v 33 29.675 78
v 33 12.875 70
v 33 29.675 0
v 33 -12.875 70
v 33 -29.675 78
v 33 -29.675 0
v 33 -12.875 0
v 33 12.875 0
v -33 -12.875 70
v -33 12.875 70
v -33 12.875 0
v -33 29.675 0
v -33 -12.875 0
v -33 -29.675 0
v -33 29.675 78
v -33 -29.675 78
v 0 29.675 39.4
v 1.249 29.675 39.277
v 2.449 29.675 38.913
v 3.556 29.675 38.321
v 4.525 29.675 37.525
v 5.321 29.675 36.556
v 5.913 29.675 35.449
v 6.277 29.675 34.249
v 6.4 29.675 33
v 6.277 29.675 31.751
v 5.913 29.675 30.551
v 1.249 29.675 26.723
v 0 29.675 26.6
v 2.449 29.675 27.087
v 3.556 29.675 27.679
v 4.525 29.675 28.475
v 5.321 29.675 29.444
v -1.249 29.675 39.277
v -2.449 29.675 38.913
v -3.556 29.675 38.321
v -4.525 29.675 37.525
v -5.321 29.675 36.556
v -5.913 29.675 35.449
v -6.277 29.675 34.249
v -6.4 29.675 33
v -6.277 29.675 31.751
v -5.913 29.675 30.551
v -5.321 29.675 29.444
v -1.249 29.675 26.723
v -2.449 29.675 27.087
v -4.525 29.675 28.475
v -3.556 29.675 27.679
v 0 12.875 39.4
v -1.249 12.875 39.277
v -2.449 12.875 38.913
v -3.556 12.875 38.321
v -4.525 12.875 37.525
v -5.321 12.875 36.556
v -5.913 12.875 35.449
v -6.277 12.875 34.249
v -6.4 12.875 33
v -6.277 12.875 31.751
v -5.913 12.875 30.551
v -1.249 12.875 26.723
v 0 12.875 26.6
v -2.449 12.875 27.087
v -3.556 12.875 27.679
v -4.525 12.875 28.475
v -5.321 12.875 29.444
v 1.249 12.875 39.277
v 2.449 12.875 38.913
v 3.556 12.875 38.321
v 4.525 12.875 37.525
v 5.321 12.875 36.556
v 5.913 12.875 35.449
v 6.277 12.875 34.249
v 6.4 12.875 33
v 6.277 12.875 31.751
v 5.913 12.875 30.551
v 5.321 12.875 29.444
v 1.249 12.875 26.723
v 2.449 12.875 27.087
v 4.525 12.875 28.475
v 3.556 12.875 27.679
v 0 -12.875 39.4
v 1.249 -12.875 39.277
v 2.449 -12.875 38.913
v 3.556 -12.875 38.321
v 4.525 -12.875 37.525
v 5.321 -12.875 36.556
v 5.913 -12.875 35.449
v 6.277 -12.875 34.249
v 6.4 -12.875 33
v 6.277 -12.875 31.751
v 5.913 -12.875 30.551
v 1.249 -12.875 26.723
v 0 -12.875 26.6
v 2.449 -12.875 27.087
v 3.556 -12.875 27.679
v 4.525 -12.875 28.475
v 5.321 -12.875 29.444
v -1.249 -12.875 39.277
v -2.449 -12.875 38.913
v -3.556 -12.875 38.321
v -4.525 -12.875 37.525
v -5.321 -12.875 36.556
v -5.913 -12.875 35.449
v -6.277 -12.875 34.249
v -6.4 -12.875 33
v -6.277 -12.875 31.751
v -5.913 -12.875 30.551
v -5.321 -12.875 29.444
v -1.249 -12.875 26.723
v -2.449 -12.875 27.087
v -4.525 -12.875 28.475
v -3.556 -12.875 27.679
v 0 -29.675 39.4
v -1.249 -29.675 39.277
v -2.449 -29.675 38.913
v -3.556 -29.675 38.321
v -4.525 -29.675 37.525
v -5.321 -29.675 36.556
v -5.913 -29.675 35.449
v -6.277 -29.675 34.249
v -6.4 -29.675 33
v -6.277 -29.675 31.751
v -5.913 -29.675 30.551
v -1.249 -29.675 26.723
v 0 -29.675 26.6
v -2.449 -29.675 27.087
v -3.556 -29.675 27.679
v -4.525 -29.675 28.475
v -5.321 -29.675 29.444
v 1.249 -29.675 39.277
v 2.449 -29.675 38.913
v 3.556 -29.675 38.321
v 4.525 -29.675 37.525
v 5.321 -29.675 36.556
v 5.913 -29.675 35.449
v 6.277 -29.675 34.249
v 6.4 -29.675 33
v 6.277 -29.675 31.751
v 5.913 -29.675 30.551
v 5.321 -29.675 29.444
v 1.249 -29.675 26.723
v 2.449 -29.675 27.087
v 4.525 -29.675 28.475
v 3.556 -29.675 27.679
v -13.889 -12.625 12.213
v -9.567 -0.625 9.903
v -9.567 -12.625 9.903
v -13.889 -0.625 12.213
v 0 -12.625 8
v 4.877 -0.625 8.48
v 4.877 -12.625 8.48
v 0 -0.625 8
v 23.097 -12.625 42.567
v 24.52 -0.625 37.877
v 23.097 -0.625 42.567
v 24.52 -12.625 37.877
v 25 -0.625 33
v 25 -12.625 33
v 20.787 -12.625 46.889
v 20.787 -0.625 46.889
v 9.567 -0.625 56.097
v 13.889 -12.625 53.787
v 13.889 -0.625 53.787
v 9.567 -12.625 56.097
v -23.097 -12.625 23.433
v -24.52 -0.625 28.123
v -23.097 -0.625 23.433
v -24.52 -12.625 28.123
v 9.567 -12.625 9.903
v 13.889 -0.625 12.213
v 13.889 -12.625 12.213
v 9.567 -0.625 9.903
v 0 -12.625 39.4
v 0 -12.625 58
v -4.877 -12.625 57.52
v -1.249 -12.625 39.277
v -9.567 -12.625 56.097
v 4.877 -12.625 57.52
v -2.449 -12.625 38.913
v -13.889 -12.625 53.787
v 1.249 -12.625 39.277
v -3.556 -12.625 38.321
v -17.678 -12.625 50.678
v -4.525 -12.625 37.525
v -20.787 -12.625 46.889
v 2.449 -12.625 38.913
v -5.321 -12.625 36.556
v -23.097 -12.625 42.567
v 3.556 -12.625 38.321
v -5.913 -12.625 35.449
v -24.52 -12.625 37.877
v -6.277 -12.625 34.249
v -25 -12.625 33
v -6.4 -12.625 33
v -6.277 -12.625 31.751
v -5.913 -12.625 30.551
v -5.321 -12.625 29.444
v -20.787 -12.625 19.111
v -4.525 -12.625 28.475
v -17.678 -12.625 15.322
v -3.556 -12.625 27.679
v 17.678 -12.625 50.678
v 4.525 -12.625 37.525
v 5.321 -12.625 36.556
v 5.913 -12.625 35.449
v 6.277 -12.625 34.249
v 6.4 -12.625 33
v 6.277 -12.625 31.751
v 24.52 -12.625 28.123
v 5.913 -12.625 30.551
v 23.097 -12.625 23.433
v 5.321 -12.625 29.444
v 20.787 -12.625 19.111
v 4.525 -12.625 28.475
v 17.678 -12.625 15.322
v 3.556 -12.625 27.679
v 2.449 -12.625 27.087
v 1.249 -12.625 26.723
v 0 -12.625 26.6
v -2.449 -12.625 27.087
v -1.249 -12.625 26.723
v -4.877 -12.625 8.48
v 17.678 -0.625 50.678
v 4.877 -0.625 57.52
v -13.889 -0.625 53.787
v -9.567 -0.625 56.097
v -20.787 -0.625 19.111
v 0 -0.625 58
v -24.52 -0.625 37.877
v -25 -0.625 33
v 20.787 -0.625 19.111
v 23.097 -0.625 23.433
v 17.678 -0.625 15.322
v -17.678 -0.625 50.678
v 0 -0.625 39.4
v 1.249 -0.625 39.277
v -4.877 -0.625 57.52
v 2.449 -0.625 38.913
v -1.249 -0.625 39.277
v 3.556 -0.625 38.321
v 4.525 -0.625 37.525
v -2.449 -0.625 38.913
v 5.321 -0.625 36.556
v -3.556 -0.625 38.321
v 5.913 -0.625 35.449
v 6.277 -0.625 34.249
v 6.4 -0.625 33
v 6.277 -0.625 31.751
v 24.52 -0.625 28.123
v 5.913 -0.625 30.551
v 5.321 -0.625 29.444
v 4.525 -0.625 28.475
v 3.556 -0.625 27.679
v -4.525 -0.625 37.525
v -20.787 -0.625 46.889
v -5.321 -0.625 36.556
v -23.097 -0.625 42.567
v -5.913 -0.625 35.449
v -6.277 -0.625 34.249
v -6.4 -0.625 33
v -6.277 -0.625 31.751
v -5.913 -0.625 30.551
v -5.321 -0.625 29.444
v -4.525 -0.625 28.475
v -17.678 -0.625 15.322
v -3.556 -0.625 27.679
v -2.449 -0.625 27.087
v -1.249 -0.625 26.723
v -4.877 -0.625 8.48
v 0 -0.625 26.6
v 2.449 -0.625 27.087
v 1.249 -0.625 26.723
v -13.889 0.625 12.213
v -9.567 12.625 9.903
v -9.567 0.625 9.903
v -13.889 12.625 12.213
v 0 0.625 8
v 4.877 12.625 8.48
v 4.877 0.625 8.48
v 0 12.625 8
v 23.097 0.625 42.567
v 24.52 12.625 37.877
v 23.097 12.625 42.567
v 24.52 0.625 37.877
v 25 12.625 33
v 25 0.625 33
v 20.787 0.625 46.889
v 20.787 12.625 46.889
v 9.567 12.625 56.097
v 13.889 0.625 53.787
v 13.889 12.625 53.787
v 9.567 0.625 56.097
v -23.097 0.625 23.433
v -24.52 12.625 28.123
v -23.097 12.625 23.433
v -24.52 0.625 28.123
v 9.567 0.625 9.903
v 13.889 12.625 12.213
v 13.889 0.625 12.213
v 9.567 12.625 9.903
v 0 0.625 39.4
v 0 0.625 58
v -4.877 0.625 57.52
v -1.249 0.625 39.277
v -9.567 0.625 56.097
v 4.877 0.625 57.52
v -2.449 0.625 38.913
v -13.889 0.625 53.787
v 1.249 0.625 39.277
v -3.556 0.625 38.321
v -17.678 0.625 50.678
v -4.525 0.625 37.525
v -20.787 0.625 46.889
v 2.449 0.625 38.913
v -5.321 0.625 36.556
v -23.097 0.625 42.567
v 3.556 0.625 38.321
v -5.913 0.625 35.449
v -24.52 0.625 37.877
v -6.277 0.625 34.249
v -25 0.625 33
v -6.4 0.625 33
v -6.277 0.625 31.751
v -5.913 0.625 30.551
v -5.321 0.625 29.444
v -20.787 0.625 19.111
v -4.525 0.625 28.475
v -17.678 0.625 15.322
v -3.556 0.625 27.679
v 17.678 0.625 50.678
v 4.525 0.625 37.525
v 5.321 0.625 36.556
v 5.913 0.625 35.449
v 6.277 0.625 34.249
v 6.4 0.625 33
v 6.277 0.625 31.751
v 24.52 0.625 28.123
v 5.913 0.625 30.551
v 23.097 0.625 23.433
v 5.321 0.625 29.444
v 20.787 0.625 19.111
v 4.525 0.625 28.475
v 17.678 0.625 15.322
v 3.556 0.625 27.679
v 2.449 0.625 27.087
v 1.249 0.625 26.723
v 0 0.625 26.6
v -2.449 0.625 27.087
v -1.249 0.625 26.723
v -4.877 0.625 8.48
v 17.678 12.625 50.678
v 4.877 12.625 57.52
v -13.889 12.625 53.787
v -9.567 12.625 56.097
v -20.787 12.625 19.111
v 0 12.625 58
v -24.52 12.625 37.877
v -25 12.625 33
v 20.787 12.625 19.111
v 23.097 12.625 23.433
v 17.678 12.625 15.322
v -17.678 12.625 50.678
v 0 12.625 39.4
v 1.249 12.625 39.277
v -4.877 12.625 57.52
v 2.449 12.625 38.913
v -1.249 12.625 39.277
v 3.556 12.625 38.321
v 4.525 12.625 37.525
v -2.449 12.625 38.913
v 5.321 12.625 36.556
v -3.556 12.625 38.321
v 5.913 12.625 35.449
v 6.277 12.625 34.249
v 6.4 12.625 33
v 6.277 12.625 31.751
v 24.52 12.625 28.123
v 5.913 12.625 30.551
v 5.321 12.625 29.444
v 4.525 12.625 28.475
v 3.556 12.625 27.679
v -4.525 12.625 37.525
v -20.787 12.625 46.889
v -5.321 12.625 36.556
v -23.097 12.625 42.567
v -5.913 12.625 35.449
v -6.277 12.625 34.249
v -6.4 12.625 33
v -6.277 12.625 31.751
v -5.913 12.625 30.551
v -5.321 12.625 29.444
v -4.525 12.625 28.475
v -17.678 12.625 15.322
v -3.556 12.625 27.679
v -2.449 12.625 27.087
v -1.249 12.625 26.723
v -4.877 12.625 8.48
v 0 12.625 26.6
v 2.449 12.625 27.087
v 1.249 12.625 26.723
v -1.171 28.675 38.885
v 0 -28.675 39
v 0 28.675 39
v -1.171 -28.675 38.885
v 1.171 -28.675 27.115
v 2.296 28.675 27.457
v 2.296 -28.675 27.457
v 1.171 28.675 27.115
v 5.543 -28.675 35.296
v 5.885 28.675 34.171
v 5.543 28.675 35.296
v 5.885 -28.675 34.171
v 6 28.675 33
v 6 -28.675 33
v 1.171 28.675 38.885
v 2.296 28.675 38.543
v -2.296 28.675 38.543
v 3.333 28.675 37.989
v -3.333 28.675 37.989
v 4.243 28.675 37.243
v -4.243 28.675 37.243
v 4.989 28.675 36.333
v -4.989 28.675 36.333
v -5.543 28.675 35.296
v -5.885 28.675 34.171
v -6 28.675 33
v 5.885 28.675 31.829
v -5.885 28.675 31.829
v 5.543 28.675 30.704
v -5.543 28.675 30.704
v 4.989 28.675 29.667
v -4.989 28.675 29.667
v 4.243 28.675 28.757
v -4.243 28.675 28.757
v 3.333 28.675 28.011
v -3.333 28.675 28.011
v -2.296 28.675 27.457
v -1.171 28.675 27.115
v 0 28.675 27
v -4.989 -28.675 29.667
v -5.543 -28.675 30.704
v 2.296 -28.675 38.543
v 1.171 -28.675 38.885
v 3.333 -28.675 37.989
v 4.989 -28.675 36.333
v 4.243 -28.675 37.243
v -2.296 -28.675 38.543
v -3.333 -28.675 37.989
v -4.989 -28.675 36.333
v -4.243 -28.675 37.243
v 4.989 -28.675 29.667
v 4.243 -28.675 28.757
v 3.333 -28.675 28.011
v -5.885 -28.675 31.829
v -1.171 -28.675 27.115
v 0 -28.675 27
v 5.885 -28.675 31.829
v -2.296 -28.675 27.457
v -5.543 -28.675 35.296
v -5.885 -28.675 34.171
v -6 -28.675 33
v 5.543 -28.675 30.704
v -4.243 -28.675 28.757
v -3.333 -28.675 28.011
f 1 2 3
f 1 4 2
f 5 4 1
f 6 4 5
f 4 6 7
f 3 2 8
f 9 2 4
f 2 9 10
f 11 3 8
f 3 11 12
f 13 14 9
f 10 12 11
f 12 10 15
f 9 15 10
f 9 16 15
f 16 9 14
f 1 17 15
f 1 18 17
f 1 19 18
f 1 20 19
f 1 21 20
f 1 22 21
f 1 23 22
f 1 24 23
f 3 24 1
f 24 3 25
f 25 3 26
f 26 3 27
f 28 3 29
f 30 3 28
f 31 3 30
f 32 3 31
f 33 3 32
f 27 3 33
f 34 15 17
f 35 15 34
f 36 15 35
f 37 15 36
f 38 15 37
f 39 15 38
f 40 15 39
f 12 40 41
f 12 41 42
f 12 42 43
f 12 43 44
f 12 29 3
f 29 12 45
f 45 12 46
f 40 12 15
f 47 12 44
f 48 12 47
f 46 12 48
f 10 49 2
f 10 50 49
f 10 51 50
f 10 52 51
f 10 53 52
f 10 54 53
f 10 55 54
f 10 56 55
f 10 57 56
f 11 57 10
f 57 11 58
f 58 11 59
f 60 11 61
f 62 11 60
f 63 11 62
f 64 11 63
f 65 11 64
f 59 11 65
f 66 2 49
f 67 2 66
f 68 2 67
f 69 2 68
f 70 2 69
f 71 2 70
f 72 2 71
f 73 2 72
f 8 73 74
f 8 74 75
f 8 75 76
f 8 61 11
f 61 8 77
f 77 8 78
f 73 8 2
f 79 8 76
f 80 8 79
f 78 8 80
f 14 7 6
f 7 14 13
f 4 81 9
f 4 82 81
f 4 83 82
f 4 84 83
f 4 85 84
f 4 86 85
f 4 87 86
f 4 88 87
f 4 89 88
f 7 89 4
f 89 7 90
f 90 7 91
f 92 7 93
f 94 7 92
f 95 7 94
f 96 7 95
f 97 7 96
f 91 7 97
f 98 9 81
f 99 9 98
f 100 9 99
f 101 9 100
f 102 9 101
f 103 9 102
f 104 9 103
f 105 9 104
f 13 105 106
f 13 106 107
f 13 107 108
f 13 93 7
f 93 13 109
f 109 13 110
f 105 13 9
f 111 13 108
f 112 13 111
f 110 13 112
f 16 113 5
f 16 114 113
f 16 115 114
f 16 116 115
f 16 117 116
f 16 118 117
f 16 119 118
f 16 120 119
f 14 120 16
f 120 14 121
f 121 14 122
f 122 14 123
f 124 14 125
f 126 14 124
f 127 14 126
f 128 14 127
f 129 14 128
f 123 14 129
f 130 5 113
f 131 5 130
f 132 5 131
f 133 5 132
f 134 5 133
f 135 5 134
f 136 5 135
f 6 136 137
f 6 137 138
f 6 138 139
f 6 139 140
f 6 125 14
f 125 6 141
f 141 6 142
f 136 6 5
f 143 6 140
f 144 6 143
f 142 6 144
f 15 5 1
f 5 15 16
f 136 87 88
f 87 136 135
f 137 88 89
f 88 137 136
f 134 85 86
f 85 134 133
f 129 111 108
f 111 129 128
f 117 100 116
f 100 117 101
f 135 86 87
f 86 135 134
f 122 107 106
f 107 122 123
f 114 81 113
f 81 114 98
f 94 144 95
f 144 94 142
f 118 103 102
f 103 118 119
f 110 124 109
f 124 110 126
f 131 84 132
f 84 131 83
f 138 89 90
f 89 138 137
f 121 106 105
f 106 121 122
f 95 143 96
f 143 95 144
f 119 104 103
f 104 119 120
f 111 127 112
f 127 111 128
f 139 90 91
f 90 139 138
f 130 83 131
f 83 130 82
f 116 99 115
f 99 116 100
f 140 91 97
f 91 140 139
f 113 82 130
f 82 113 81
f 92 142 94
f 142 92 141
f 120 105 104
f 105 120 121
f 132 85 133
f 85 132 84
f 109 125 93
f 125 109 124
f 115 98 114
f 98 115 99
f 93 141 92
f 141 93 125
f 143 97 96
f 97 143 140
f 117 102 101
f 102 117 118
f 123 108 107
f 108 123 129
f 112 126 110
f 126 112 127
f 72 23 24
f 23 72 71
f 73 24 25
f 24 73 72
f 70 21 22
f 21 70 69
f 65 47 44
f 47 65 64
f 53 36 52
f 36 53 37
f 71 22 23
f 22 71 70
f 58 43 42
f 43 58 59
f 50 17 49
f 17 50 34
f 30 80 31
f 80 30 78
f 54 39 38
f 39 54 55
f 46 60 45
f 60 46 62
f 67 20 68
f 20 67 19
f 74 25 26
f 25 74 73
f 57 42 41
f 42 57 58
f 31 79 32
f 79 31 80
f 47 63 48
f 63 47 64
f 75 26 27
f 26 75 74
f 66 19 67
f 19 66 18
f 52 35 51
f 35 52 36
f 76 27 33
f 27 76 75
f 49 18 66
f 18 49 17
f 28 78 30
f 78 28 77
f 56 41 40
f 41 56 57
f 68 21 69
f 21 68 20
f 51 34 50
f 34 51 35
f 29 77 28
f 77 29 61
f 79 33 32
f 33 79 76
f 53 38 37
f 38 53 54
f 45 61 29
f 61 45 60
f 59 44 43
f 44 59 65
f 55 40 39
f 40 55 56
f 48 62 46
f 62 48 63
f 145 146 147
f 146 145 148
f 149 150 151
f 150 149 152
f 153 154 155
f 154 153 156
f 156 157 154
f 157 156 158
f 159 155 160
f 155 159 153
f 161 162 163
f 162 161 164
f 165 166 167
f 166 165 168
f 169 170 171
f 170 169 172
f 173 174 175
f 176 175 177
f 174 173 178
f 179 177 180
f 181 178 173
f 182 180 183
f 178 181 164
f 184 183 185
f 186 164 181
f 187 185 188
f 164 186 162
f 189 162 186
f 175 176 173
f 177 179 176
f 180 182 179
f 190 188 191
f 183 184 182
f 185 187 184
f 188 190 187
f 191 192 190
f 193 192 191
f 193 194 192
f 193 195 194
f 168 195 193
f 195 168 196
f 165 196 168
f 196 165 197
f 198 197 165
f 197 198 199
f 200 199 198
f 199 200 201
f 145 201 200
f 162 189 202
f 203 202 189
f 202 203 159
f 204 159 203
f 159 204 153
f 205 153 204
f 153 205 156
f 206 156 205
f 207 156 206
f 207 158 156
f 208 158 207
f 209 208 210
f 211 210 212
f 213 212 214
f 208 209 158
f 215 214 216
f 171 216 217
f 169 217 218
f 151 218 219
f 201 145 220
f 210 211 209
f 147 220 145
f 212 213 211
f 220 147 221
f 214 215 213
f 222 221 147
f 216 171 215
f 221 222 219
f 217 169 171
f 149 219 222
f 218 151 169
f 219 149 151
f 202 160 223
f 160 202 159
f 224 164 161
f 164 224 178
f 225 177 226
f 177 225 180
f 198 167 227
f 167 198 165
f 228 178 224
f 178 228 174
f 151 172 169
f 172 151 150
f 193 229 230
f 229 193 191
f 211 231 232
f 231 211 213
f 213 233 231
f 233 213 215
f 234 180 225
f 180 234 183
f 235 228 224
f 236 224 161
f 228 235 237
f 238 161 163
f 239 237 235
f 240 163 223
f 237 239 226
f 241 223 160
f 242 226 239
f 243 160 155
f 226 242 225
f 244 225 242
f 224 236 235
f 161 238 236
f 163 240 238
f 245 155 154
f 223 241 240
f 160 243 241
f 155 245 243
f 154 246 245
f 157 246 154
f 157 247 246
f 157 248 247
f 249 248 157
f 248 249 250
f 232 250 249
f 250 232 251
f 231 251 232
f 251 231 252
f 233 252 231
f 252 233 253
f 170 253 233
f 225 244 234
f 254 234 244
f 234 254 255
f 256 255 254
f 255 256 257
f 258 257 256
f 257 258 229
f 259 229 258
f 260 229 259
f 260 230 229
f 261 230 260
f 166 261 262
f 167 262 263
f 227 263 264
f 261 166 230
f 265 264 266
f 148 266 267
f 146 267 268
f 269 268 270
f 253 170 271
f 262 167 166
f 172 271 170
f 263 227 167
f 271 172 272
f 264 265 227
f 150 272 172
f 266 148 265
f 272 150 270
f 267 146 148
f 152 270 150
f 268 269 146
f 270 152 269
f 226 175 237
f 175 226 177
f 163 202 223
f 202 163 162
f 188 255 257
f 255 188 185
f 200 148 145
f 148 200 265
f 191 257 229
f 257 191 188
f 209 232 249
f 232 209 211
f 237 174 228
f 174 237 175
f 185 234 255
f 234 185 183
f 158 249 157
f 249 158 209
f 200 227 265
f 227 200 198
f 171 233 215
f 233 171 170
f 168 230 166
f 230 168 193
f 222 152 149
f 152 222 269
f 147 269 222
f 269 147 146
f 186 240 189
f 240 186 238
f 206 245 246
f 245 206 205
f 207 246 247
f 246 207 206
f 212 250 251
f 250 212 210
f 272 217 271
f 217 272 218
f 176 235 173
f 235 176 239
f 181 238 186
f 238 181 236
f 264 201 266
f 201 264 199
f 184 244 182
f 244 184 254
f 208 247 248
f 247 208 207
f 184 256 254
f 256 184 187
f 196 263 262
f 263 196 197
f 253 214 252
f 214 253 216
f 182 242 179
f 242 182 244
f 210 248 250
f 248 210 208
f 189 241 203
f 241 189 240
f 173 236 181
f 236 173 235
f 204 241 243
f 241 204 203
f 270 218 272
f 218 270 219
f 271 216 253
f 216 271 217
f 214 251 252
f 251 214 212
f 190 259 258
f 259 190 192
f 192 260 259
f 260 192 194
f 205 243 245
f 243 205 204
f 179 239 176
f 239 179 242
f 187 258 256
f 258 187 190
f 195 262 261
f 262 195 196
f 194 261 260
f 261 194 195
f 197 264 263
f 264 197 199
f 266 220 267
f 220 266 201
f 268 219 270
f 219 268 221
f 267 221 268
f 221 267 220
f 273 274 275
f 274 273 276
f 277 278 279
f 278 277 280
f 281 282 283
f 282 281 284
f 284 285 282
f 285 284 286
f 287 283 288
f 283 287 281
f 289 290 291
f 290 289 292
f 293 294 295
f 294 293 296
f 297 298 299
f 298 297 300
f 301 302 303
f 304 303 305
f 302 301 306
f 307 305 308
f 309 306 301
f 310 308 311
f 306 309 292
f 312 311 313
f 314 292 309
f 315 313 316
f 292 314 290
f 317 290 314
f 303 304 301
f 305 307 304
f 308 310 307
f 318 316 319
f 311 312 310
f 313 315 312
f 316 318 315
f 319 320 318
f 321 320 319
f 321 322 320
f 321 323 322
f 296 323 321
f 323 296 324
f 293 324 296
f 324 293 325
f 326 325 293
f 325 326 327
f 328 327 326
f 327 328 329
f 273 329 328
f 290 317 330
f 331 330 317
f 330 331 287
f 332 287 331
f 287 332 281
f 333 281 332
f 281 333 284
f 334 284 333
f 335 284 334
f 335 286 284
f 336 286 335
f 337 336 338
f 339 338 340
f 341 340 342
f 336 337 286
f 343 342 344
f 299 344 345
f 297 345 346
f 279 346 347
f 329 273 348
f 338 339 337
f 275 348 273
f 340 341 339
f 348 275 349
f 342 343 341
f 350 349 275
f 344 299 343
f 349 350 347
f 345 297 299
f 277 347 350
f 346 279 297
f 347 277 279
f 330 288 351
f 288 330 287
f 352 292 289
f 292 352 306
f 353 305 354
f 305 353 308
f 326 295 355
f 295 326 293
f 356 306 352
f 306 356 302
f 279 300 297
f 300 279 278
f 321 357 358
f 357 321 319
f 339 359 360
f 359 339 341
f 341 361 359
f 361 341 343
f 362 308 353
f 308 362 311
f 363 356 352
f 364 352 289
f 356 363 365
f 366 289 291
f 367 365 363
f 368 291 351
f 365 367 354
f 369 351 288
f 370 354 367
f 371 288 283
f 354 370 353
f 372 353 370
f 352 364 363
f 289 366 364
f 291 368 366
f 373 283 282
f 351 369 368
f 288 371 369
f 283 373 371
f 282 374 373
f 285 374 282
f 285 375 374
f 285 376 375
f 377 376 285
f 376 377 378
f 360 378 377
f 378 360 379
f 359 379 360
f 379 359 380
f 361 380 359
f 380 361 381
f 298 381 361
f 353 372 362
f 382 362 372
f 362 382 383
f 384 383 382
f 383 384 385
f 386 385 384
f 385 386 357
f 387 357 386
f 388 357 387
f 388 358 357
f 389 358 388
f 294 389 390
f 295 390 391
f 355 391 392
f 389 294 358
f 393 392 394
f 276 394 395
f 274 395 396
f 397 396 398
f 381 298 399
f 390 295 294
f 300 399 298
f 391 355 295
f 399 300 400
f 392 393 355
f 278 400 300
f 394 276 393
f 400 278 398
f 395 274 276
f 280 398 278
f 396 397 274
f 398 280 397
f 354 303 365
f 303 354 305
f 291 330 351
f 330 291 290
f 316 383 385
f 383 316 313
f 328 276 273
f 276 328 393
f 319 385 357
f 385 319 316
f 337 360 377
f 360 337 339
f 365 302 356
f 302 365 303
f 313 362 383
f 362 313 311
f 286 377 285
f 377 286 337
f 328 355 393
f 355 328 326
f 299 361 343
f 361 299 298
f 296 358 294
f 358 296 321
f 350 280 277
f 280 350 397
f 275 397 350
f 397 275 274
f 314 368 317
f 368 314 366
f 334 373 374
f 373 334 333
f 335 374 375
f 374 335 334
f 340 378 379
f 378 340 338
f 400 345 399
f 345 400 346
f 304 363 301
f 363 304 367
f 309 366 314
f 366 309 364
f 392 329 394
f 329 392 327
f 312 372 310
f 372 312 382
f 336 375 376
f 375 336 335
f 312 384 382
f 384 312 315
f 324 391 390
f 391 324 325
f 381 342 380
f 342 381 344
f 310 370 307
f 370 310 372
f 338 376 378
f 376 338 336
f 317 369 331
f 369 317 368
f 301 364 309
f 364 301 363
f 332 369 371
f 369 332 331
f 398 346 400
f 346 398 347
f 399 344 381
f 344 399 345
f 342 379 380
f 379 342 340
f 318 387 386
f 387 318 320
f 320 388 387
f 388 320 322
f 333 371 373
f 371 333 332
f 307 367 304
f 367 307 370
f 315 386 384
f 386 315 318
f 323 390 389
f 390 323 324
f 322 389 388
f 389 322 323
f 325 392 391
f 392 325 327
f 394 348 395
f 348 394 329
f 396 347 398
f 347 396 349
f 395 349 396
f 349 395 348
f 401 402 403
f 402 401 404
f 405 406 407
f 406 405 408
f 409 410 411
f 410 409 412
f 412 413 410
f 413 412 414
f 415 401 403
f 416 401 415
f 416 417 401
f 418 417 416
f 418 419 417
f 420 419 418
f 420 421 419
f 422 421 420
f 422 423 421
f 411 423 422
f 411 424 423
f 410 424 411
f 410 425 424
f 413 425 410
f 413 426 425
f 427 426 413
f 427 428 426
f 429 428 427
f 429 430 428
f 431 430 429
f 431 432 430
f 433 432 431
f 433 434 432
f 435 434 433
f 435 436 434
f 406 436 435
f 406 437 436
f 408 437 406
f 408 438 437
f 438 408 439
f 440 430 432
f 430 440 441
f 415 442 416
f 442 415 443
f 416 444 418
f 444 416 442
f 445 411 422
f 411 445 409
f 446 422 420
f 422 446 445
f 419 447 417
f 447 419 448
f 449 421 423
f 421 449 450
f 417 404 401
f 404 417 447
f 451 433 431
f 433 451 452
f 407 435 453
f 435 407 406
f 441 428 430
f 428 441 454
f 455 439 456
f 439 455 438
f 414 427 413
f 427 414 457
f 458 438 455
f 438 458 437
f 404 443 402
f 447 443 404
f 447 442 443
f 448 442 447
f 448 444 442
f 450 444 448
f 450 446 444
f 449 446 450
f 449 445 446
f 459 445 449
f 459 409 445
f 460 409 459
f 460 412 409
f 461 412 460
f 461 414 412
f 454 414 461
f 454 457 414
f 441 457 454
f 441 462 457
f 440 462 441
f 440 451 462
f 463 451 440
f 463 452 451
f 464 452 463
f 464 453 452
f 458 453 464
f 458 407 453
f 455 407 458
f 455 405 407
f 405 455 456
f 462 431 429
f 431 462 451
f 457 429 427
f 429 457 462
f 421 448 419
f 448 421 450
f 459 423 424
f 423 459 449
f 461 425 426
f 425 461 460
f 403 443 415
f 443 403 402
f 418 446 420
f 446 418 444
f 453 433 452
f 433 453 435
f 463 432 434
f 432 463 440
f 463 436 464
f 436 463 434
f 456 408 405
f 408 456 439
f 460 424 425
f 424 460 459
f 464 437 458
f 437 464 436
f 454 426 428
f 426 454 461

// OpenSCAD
$fn = 32;

// ------------------------------------------------------------------------
// Trolley wheel set: wheels d50, fork 70 mm tall
// Every part is its own module, assembly() places every instance.
// ------------------------------------------------------------------------

// --- part 1 ---
module trolley_fork() {
  difference() {
    union() {
      translate([-33, 12.875, 0]) cube([66, 16.8, 70]);
      translate([-33, -29.675, 0]) cube([66, 16.8, 70]);
      translate([-33, -29.675, 70]) cube([66, 59.35, 8]);
    }
    translate([0, -21.275, 33]) rotate([90, 0, 0]) cylinder(h = 18.8, d = 12.8, center = true);
    translate([0, 21.275, 33]) rotate([90, 0, 0]) cylinder(h = 18.8, d = 12.8, center = true);
  }
}

// --- part 2 ---
module trolley_wheel() {
  difference() {
      translate([0, 0, 0]) cylinder(h = 12, d = 50);
      translate([0, 0, -1]) cylinder(h = 14, d = 12.8);
    }
}

// --- part 3 ---
module trolley_axle() {
  translate([0, 0, -28.675]) cylinder(h = 57.35, d = 12);
}

// --- assembly ---
module assembly() {
  color([0.80, 0.24, 0.20]) translate([0, 0, 0]) rotate([0, 0, 0]) trolley_fork();
  color([0.20, 0.45, 0.75]) translate([0, -0.625, 33]) rotate([90, 0, 0]) trolley_wheel();
  color([0.25, 0.62, 0.32]) translate([0, 12.625, 33]) rotate([90, 0, 0]) trolley_wheel();
  color([0.92, 0.70, 0.18]) translate([0, 0, 33]) rotate([90, 0, 0]) trolley_axle();
}

assembly();
